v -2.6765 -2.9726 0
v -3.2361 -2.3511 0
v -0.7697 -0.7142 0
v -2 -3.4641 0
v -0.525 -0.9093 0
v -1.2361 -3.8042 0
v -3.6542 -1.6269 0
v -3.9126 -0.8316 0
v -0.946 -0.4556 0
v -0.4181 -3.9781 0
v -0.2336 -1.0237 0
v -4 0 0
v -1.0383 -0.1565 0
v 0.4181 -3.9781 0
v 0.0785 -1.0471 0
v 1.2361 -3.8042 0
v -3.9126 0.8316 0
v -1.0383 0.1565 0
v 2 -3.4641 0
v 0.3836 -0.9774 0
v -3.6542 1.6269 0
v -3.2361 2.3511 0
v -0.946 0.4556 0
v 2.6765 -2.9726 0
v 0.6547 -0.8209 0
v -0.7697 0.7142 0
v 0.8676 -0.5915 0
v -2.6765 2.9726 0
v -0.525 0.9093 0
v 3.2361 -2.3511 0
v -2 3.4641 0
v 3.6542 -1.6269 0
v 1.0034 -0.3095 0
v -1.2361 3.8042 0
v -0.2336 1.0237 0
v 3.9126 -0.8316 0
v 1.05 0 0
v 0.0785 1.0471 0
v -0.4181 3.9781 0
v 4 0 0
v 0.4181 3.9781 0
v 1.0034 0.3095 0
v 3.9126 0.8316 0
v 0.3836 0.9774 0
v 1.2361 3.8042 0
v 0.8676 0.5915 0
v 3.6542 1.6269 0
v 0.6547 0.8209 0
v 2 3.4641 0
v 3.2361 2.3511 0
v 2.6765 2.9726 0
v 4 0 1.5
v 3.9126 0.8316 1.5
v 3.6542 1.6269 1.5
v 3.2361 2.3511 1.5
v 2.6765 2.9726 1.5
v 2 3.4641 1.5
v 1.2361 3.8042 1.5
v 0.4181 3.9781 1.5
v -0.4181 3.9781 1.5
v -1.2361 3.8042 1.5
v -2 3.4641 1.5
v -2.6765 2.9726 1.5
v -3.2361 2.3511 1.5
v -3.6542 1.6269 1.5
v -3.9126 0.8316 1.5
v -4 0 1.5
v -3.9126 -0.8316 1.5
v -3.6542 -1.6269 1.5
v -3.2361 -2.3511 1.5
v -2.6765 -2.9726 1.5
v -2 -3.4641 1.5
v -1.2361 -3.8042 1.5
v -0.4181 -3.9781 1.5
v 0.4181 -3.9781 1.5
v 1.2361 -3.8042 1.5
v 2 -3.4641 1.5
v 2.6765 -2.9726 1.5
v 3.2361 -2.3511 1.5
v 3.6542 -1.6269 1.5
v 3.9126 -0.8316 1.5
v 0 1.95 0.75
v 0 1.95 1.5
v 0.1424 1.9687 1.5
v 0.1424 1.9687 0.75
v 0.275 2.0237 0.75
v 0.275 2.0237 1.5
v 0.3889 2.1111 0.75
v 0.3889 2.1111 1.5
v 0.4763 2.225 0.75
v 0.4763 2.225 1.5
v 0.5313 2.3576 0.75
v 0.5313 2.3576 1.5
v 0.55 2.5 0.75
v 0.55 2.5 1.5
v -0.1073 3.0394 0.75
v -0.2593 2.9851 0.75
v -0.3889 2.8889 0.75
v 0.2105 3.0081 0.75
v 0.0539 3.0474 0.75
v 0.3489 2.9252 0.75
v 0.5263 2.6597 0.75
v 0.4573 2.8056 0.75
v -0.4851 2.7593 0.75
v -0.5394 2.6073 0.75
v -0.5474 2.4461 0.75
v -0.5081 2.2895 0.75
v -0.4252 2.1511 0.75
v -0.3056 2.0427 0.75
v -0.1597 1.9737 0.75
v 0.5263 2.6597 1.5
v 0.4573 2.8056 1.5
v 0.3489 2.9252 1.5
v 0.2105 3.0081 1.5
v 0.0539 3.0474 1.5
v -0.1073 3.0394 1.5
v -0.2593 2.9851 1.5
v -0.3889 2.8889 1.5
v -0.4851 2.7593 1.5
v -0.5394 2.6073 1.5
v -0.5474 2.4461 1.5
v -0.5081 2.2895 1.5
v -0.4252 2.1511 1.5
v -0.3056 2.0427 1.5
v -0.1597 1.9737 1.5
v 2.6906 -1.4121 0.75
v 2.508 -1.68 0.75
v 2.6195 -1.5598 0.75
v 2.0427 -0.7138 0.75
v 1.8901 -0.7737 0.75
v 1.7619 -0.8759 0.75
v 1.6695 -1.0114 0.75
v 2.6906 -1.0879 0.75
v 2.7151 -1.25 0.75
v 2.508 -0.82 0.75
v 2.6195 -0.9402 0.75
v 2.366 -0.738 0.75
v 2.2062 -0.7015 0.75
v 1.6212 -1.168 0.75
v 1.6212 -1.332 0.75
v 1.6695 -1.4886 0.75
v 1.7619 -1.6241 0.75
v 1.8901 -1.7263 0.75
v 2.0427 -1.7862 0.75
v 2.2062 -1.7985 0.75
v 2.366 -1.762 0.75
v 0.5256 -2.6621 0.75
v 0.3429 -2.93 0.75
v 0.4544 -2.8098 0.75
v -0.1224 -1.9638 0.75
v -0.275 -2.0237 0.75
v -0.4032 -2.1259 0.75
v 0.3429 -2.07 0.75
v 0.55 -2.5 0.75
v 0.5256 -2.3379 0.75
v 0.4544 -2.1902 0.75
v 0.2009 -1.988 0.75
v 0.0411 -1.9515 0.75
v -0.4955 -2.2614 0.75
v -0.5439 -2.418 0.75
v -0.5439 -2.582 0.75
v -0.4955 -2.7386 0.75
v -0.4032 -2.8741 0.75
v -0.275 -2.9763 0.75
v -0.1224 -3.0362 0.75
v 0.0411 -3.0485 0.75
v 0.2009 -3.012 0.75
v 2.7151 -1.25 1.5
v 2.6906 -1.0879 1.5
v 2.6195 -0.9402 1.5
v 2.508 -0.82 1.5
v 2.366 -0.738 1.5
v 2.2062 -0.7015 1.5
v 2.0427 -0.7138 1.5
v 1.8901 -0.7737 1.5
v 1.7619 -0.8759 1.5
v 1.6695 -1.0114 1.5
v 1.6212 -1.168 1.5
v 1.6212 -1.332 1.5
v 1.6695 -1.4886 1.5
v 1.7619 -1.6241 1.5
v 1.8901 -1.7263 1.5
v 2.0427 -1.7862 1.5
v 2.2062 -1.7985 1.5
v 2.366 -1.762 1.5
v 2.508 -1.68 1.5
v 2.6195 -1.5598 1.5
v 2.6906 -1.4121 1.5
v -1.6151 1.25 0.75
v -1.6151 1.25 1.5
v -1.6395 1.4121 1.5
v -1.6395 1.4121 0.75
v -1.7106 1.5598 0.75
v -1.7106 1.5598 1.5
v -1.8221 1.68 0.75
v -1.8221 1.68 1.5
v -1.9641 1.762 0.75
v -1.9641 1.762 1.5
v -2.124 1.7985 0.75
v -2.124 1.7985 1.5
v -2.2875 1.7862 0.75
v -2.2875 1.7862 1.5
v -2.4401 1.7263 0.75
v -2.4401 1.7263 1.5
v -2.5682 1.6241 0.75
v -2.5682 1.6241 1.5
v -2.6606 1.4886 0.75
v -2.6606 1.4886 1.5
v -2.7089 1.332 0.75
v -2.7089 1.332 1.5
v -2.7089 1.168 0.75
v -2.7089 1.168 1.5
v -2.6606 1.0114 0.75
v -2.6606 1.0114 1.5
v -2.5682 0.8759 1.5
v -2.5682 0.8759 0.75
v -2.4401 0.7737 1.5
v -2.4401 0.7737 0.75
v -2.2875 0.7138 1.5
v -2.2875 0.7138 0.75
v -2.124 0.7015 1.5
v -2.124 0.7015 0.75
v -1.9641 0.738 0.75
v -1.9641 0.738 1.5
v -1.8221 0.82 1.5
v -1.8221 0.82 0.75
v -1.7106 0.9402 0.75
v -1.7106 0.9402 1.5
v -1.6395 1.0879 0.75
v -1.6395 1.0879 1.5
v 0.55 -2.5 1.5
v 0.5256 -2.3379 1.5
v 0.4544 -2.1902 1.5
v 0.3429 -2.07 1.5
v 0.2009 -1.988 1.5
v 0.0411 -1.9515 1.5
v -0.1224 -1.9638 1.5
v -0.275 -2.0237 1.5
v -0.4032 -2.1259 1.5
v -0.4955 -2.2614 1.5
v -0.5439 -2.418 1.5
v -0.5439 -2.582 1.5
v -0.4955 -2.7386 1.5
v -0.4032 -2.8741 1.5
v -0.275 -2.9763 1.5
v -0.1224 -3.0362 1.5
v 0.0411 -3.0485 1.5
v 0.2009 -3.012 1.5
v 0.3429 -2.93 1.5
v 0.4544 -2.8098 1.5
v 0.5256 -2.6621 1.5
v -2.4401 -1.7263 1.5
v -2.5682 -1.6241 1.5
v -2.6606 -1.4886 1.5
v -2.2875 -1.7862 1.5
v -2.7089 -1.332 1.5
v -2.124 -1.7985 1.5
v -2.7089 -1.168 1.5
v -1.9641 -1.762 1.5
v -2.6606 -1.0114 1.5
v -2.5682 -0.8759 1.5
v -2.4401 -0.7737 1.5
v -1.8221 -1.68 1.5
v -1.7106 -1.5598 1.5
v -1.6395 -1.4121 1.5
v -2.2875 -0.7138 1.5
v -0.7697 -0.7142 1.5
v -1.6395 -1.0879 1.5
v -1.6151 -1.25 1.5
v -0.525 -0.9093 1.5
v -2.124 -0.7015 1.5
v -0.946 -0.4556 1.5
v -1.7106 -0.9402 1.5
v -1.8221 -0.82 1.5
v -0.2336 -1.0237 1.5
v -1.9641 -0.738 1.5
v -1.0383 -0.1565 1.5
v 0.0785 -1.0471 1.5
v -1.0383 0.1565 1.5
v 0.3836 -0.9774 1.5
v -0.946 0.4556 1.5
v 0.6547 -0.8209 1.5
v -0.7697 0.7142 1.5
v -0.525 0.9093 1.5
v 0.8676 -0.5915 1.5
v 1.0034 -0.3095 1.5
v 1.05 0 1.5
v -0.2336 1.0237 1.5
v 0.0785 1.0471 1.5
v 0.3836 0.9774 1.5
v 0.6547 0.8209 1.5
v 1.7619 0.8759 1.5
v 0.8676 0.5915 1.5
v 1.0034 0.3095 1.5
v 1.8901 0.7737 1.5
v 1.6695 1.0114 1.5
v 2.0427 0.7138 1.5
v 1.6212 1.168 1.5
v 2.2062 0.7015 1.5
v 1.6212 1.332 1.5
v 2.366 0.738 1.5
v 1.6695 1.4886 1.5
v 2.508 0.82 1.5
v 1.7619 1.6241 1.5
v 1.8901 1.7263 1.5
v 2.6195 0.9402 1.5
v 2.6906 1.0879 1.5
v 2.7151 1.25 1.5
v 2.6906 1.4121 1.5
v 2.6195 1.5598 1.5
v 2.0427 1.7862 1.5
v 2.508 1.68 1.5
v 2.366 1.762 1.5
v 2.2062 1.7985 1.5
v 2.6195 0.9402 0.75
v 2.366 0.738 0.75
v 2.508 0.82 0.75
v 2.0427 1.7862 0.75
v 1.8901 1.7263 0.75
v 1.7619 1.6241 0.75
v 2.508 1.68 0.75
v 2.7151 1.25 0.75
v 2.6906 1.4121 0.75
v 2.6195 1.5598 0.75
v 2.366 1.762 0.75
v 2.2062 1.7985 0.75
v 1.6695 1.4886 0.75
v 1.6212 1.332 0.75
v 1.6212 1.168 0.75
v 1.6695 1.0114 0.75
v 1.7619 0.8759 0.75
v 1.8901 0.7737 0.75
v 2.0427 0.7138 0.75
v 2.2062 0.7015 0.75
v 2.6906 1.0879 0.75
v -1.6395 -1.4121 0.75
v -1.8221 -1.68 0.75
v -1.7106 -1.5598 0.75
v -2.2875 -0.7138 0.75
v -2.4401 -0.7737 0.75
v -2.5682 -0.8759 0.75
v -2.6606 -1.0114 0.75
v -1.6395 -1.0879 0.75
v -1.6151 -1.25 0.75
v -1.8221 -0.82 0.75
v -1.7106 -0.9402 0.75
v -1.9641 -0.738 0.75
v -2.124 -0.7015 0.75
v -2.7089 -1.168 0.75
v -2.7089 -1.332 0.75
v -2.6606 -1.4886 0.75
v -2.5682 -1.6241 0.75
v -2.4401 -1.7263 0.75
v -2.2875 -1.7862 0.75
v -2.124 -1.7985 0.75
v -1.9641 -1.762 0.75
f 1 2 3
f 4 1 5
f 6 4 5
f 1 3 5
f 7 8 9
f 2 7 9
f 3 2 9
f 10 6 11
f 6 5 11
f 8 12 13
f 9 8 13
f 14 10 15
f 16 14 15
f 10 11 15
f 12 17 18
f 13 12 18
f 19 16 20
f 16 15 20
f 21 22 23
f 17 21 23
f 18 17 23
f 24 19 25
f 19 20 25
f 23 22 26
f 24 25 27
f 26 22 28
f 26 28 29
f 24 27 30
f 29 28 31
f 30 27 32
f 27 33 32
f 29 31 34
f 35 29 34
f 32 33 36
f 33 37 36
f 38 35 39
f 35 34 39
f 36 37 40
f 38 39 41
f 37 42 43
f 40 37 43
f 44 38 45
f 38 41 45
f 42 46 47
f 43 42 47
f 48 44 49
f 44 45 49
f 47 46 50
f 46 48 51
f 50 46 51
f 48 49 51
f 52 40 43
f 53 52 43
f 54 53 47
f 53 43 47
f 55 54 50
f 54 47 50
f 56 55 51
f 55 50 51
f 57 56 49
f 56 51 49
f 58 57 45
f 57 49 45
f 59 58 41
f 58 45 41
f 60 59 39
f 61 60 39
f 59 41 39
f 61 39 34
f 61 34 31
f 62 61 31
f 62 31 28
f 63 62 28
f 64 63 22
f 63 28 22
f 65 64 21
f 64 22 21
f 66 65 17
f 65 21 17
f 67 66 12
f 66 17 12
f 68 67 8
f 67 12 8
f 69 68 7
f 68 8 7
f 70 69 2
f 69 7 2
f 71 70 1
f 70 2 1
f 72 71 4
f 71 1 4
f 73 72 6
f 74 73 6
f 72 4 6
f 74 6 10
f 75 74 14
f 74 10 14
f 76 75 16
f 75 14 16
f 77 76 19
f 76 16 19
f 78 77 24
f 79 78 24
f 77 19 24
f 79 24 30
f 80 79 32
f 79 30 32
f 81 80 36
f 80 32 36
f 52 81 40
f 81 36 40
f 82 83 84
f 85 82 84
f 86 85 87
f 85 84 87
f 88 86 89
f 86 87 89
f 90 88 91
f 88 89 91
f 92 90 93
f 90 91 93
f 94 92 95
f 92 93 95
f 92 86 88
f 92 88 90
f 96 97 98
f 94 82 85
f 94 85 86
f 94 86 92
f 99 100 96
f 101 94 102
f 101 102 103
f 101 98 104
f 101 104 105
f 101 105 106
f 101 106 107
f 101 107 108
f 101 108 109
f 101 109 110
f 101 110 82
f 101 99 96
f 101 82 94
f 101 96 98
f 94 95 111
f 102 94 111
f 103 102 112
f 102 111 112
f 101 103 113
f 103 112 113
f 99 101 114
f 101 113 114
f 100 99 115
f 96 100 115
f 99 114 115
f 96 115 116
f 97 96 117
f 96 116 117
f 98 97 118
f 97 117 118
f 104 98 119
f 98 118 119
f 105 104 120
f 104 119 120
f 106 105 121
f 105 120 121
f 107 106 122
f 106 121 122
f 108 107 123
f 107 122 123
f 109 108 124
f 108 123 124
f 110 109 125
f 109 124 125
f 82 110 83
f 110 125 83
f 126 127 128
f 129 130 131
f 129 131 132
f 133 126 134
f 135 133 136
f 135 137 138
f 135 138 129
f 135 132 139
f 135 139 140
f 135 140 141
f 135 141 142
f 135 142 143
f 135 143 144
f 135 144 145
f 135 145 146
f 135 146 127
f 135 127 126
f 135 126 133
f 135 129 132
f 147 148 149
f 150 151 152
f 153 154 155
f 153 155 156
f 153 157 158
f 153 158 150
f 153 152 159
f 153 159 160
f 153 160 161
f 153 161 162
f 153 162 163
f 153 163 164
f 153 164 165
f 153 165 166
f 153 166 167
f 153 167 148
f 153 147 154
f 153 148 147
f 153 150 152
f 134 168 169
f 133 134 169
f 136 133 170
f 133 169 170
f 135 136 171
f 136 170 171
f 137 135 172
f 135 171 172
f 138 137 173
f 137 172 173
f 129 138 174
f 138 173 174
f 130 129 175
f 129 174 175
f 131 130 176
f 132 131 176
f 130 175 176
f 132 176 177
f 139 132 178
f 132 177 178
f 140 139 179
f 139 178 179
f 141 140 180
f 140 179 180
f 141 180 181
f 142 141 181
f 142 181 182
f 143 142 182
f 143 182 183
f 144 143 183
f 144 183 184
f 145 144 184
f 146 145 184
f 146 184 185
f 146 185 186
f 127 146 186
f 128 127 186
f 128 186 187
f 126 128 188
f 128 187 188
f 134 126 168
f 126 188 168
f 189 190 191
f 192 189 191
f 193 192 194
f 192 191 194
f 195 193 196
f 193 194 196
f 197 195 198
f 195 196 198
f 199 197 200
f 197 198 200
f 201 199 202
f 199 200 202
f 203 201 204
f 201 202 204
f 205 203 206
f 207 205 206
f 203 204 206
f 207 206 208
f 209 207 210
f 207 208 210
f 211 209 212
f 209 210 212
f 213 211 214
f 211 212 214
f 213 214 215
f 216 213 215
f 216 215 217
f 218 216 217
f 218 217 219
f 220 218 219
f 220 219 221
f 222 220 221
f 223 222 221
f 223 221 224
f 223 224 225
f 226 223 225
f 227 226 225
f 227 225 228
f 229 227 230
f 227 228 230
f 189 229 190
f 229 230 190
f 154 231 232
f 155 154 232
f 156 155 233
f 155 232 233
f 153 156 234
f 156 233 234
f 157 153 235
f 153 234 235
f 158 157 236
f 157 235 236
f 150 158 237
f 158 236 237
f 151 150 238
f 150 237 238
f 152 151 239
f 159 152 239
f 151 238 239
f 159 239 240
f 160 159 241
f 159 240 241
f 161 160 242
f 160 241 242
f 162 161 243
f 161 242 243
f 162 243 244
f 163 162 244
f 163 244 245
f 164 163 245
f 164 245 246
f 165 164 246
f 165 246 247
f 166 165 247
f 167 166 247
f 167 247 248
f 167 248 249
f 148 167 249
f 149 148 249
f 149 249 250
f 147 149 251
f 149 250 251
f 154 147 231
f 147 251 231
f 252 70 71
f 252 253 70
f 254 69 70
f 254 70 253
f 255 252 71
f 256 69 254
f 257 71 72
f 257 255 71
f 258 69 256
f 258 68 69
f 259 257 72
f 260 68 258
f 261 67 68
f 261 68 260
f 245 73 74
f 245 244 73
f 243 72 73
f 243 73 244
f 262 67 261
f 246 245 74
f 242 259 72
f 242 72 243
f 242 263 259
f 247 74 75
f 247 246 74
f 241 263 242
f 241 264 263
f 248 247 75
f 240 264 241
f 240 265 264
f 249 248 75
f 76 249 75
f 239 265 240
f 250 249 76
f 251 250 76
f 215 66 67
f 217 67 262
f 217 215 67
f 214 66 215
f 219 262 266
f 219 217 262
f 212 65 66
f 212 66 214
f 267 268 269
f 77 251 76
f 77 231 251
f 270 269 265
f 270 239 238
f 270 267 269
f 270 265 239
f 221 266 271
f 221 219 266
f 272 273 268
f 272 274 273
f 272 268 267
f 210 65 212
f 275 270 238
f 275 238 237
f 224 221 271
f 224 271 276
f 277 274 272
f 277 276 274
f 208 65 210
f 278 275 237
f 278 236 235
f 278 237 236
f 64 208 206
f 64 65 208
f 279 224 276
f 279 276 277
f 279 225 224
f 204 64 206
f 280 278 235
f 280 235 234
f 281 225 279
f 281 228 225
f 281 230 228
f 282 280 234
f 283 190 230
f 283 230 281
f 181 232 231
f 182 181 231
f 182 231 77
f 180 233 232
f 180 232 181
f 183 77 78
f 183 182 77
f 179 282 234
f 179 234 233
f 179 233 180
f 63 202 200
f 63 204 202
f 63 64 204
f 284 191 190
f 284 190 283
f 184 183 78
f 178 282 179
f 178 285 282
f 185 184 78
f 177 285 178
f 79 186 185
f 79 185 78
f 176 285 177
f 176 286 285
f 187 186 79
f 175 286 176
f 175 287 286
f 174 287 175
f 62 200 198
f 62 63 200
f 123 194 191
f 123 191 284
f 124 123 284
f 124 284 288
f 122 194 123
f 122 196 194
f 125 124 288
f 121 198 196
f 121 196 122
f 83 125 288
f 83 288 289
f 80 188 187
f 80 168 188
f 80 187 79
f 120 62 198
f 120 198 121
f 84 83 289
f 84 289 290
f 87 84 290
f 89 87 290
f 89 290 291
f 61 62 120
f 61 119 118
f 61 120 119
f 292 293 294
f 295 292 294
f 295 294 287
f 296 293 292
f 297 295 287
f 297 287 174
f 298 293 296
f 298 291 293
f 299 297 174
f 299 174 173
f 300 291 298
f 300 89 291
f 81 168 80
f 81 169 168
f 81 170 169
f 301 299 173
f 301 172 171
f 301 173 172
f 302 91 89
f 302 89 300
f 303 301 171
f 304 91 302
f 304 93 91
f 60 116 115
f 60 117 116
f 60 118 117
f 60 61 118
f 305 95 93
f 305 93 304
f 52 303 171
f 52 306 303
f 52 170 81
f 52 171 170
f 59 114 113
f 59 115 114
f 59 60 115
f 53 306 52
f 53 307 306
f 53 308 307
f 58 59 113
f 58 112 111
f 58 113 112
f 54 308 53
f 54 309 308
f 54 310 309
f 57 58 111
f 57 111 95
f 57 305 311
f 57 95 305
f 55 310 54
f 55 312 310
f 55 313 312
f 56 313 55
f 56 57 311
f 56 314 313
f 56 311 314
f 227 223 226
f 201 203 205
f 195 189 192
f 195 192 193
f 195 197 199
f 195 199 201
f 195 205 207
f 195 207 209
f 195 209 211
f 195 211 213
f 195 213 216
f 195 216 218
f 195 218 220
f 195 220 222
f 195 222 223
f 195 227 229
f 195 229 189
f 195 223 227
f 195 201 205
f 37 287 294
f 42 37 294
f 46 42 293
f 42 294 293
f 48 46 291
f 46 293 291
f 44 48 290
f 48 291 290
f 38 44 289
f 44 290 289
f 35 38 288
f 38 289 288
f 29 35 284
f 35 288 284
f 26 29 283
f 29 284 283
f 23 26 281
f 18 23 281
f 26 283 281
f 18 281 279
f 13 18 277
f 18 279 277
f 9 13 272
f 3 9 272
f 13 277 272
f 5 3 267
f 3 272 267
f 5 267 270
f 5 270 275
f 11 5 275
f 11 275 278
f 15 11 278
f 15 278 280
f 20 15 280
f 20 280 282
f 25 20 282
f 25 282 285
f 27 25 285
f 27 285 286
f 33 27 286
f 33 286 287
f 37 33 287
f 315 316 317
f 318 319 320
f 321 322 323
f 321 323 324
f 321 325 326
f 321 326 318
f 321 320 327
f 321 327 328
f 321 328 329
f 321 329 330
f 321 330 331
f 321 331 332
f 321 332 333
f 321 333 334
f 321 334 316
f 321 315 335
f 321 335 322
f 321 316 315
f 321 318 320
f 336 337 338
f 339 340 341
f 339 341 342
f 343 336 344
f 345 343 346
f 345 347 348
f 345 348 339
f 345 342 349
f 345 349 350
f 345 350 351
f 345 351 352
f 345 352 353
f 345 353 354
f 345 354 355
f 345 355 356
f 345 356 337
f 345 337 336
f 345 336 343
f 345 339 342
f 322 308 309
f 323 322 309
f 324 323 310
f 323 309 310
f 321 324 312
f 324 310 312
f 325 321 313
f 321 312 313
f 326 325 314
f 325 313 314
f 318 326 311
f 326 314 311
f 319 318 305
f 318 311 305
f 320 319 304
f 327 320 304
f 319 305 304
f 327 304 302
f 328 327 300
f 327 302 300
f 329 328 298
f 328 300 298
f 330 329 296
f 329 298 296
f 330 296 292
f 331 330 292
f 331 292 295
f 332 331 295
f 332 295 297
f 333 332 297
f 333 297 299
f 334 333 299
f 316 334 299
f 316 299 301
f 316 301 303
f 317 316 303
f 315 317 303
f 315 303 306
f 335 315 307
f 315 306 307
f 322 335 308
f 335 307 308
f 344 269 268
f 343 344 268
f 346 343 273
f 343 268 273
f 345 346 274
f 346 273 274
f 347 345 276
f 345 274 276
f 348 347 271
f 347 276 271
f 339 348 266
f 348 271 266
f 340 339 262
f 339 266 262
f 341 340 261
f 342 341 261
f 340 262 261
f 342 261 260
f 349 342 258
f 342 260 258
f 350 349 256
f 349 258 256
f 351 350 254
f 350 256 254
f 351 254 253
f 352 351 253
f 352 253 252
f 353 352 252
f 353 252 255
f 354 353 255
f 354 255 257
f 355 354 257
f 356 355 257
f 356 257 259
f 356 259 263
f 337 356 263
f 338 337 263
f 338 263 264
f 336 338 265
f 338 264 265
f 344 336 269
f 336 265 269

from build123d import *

# Parameters (mm, degrees)
F0_R     = 4
F1_DEPTH = 1.5
F2_R     = 0.55
F3_DEPTH = 0.75
F4_R     = 1.05
F5_DEPTH = 25


with BuildPart() as f1:
    # F0 (on Top) → F1 (new body)
    with BuildSketch(Plane.XY):
        Circle(F0_R)
    extrude(amount=F1_DEPTH)

    # F2 (on face) → F3 (cut)
    with BuildSketch(Plane.XY.offset(1.5)):
        with BuildLine():
            ThreePointArc((0, 1.95), (0.388909, 2.111091), (0.55, 2.5))
            ThreePointArc((0.55, 2.5), (-0.388909, 2.888909), (0, 1.95))
        make_face()
        with Locations((-2.165064, 1.25)):
            Circle(F2_R)
        with Locations((-2.165064, -1.25)):
            Circle(F2_R)
        with Locations((2.165064, 1.25)):
            Circle(F2_R)
        with Locations((2.165064, -1.25)):
            Circle(F2_R)
        with Locations((0, -2.5)):
            Circle(F2_R)
    extrude(amount=-F3_DEPTH, mode=Mode.SUBTRACT)

    # F4 (on face) → F5 (cut)
    with BuildSketch(Plane.XY.offset(1.5)):
        Circle(F4_R)
    extrude(amount=-F5_DEPTH, mode=Mode.SUBTRACT)


solid = f1.part
